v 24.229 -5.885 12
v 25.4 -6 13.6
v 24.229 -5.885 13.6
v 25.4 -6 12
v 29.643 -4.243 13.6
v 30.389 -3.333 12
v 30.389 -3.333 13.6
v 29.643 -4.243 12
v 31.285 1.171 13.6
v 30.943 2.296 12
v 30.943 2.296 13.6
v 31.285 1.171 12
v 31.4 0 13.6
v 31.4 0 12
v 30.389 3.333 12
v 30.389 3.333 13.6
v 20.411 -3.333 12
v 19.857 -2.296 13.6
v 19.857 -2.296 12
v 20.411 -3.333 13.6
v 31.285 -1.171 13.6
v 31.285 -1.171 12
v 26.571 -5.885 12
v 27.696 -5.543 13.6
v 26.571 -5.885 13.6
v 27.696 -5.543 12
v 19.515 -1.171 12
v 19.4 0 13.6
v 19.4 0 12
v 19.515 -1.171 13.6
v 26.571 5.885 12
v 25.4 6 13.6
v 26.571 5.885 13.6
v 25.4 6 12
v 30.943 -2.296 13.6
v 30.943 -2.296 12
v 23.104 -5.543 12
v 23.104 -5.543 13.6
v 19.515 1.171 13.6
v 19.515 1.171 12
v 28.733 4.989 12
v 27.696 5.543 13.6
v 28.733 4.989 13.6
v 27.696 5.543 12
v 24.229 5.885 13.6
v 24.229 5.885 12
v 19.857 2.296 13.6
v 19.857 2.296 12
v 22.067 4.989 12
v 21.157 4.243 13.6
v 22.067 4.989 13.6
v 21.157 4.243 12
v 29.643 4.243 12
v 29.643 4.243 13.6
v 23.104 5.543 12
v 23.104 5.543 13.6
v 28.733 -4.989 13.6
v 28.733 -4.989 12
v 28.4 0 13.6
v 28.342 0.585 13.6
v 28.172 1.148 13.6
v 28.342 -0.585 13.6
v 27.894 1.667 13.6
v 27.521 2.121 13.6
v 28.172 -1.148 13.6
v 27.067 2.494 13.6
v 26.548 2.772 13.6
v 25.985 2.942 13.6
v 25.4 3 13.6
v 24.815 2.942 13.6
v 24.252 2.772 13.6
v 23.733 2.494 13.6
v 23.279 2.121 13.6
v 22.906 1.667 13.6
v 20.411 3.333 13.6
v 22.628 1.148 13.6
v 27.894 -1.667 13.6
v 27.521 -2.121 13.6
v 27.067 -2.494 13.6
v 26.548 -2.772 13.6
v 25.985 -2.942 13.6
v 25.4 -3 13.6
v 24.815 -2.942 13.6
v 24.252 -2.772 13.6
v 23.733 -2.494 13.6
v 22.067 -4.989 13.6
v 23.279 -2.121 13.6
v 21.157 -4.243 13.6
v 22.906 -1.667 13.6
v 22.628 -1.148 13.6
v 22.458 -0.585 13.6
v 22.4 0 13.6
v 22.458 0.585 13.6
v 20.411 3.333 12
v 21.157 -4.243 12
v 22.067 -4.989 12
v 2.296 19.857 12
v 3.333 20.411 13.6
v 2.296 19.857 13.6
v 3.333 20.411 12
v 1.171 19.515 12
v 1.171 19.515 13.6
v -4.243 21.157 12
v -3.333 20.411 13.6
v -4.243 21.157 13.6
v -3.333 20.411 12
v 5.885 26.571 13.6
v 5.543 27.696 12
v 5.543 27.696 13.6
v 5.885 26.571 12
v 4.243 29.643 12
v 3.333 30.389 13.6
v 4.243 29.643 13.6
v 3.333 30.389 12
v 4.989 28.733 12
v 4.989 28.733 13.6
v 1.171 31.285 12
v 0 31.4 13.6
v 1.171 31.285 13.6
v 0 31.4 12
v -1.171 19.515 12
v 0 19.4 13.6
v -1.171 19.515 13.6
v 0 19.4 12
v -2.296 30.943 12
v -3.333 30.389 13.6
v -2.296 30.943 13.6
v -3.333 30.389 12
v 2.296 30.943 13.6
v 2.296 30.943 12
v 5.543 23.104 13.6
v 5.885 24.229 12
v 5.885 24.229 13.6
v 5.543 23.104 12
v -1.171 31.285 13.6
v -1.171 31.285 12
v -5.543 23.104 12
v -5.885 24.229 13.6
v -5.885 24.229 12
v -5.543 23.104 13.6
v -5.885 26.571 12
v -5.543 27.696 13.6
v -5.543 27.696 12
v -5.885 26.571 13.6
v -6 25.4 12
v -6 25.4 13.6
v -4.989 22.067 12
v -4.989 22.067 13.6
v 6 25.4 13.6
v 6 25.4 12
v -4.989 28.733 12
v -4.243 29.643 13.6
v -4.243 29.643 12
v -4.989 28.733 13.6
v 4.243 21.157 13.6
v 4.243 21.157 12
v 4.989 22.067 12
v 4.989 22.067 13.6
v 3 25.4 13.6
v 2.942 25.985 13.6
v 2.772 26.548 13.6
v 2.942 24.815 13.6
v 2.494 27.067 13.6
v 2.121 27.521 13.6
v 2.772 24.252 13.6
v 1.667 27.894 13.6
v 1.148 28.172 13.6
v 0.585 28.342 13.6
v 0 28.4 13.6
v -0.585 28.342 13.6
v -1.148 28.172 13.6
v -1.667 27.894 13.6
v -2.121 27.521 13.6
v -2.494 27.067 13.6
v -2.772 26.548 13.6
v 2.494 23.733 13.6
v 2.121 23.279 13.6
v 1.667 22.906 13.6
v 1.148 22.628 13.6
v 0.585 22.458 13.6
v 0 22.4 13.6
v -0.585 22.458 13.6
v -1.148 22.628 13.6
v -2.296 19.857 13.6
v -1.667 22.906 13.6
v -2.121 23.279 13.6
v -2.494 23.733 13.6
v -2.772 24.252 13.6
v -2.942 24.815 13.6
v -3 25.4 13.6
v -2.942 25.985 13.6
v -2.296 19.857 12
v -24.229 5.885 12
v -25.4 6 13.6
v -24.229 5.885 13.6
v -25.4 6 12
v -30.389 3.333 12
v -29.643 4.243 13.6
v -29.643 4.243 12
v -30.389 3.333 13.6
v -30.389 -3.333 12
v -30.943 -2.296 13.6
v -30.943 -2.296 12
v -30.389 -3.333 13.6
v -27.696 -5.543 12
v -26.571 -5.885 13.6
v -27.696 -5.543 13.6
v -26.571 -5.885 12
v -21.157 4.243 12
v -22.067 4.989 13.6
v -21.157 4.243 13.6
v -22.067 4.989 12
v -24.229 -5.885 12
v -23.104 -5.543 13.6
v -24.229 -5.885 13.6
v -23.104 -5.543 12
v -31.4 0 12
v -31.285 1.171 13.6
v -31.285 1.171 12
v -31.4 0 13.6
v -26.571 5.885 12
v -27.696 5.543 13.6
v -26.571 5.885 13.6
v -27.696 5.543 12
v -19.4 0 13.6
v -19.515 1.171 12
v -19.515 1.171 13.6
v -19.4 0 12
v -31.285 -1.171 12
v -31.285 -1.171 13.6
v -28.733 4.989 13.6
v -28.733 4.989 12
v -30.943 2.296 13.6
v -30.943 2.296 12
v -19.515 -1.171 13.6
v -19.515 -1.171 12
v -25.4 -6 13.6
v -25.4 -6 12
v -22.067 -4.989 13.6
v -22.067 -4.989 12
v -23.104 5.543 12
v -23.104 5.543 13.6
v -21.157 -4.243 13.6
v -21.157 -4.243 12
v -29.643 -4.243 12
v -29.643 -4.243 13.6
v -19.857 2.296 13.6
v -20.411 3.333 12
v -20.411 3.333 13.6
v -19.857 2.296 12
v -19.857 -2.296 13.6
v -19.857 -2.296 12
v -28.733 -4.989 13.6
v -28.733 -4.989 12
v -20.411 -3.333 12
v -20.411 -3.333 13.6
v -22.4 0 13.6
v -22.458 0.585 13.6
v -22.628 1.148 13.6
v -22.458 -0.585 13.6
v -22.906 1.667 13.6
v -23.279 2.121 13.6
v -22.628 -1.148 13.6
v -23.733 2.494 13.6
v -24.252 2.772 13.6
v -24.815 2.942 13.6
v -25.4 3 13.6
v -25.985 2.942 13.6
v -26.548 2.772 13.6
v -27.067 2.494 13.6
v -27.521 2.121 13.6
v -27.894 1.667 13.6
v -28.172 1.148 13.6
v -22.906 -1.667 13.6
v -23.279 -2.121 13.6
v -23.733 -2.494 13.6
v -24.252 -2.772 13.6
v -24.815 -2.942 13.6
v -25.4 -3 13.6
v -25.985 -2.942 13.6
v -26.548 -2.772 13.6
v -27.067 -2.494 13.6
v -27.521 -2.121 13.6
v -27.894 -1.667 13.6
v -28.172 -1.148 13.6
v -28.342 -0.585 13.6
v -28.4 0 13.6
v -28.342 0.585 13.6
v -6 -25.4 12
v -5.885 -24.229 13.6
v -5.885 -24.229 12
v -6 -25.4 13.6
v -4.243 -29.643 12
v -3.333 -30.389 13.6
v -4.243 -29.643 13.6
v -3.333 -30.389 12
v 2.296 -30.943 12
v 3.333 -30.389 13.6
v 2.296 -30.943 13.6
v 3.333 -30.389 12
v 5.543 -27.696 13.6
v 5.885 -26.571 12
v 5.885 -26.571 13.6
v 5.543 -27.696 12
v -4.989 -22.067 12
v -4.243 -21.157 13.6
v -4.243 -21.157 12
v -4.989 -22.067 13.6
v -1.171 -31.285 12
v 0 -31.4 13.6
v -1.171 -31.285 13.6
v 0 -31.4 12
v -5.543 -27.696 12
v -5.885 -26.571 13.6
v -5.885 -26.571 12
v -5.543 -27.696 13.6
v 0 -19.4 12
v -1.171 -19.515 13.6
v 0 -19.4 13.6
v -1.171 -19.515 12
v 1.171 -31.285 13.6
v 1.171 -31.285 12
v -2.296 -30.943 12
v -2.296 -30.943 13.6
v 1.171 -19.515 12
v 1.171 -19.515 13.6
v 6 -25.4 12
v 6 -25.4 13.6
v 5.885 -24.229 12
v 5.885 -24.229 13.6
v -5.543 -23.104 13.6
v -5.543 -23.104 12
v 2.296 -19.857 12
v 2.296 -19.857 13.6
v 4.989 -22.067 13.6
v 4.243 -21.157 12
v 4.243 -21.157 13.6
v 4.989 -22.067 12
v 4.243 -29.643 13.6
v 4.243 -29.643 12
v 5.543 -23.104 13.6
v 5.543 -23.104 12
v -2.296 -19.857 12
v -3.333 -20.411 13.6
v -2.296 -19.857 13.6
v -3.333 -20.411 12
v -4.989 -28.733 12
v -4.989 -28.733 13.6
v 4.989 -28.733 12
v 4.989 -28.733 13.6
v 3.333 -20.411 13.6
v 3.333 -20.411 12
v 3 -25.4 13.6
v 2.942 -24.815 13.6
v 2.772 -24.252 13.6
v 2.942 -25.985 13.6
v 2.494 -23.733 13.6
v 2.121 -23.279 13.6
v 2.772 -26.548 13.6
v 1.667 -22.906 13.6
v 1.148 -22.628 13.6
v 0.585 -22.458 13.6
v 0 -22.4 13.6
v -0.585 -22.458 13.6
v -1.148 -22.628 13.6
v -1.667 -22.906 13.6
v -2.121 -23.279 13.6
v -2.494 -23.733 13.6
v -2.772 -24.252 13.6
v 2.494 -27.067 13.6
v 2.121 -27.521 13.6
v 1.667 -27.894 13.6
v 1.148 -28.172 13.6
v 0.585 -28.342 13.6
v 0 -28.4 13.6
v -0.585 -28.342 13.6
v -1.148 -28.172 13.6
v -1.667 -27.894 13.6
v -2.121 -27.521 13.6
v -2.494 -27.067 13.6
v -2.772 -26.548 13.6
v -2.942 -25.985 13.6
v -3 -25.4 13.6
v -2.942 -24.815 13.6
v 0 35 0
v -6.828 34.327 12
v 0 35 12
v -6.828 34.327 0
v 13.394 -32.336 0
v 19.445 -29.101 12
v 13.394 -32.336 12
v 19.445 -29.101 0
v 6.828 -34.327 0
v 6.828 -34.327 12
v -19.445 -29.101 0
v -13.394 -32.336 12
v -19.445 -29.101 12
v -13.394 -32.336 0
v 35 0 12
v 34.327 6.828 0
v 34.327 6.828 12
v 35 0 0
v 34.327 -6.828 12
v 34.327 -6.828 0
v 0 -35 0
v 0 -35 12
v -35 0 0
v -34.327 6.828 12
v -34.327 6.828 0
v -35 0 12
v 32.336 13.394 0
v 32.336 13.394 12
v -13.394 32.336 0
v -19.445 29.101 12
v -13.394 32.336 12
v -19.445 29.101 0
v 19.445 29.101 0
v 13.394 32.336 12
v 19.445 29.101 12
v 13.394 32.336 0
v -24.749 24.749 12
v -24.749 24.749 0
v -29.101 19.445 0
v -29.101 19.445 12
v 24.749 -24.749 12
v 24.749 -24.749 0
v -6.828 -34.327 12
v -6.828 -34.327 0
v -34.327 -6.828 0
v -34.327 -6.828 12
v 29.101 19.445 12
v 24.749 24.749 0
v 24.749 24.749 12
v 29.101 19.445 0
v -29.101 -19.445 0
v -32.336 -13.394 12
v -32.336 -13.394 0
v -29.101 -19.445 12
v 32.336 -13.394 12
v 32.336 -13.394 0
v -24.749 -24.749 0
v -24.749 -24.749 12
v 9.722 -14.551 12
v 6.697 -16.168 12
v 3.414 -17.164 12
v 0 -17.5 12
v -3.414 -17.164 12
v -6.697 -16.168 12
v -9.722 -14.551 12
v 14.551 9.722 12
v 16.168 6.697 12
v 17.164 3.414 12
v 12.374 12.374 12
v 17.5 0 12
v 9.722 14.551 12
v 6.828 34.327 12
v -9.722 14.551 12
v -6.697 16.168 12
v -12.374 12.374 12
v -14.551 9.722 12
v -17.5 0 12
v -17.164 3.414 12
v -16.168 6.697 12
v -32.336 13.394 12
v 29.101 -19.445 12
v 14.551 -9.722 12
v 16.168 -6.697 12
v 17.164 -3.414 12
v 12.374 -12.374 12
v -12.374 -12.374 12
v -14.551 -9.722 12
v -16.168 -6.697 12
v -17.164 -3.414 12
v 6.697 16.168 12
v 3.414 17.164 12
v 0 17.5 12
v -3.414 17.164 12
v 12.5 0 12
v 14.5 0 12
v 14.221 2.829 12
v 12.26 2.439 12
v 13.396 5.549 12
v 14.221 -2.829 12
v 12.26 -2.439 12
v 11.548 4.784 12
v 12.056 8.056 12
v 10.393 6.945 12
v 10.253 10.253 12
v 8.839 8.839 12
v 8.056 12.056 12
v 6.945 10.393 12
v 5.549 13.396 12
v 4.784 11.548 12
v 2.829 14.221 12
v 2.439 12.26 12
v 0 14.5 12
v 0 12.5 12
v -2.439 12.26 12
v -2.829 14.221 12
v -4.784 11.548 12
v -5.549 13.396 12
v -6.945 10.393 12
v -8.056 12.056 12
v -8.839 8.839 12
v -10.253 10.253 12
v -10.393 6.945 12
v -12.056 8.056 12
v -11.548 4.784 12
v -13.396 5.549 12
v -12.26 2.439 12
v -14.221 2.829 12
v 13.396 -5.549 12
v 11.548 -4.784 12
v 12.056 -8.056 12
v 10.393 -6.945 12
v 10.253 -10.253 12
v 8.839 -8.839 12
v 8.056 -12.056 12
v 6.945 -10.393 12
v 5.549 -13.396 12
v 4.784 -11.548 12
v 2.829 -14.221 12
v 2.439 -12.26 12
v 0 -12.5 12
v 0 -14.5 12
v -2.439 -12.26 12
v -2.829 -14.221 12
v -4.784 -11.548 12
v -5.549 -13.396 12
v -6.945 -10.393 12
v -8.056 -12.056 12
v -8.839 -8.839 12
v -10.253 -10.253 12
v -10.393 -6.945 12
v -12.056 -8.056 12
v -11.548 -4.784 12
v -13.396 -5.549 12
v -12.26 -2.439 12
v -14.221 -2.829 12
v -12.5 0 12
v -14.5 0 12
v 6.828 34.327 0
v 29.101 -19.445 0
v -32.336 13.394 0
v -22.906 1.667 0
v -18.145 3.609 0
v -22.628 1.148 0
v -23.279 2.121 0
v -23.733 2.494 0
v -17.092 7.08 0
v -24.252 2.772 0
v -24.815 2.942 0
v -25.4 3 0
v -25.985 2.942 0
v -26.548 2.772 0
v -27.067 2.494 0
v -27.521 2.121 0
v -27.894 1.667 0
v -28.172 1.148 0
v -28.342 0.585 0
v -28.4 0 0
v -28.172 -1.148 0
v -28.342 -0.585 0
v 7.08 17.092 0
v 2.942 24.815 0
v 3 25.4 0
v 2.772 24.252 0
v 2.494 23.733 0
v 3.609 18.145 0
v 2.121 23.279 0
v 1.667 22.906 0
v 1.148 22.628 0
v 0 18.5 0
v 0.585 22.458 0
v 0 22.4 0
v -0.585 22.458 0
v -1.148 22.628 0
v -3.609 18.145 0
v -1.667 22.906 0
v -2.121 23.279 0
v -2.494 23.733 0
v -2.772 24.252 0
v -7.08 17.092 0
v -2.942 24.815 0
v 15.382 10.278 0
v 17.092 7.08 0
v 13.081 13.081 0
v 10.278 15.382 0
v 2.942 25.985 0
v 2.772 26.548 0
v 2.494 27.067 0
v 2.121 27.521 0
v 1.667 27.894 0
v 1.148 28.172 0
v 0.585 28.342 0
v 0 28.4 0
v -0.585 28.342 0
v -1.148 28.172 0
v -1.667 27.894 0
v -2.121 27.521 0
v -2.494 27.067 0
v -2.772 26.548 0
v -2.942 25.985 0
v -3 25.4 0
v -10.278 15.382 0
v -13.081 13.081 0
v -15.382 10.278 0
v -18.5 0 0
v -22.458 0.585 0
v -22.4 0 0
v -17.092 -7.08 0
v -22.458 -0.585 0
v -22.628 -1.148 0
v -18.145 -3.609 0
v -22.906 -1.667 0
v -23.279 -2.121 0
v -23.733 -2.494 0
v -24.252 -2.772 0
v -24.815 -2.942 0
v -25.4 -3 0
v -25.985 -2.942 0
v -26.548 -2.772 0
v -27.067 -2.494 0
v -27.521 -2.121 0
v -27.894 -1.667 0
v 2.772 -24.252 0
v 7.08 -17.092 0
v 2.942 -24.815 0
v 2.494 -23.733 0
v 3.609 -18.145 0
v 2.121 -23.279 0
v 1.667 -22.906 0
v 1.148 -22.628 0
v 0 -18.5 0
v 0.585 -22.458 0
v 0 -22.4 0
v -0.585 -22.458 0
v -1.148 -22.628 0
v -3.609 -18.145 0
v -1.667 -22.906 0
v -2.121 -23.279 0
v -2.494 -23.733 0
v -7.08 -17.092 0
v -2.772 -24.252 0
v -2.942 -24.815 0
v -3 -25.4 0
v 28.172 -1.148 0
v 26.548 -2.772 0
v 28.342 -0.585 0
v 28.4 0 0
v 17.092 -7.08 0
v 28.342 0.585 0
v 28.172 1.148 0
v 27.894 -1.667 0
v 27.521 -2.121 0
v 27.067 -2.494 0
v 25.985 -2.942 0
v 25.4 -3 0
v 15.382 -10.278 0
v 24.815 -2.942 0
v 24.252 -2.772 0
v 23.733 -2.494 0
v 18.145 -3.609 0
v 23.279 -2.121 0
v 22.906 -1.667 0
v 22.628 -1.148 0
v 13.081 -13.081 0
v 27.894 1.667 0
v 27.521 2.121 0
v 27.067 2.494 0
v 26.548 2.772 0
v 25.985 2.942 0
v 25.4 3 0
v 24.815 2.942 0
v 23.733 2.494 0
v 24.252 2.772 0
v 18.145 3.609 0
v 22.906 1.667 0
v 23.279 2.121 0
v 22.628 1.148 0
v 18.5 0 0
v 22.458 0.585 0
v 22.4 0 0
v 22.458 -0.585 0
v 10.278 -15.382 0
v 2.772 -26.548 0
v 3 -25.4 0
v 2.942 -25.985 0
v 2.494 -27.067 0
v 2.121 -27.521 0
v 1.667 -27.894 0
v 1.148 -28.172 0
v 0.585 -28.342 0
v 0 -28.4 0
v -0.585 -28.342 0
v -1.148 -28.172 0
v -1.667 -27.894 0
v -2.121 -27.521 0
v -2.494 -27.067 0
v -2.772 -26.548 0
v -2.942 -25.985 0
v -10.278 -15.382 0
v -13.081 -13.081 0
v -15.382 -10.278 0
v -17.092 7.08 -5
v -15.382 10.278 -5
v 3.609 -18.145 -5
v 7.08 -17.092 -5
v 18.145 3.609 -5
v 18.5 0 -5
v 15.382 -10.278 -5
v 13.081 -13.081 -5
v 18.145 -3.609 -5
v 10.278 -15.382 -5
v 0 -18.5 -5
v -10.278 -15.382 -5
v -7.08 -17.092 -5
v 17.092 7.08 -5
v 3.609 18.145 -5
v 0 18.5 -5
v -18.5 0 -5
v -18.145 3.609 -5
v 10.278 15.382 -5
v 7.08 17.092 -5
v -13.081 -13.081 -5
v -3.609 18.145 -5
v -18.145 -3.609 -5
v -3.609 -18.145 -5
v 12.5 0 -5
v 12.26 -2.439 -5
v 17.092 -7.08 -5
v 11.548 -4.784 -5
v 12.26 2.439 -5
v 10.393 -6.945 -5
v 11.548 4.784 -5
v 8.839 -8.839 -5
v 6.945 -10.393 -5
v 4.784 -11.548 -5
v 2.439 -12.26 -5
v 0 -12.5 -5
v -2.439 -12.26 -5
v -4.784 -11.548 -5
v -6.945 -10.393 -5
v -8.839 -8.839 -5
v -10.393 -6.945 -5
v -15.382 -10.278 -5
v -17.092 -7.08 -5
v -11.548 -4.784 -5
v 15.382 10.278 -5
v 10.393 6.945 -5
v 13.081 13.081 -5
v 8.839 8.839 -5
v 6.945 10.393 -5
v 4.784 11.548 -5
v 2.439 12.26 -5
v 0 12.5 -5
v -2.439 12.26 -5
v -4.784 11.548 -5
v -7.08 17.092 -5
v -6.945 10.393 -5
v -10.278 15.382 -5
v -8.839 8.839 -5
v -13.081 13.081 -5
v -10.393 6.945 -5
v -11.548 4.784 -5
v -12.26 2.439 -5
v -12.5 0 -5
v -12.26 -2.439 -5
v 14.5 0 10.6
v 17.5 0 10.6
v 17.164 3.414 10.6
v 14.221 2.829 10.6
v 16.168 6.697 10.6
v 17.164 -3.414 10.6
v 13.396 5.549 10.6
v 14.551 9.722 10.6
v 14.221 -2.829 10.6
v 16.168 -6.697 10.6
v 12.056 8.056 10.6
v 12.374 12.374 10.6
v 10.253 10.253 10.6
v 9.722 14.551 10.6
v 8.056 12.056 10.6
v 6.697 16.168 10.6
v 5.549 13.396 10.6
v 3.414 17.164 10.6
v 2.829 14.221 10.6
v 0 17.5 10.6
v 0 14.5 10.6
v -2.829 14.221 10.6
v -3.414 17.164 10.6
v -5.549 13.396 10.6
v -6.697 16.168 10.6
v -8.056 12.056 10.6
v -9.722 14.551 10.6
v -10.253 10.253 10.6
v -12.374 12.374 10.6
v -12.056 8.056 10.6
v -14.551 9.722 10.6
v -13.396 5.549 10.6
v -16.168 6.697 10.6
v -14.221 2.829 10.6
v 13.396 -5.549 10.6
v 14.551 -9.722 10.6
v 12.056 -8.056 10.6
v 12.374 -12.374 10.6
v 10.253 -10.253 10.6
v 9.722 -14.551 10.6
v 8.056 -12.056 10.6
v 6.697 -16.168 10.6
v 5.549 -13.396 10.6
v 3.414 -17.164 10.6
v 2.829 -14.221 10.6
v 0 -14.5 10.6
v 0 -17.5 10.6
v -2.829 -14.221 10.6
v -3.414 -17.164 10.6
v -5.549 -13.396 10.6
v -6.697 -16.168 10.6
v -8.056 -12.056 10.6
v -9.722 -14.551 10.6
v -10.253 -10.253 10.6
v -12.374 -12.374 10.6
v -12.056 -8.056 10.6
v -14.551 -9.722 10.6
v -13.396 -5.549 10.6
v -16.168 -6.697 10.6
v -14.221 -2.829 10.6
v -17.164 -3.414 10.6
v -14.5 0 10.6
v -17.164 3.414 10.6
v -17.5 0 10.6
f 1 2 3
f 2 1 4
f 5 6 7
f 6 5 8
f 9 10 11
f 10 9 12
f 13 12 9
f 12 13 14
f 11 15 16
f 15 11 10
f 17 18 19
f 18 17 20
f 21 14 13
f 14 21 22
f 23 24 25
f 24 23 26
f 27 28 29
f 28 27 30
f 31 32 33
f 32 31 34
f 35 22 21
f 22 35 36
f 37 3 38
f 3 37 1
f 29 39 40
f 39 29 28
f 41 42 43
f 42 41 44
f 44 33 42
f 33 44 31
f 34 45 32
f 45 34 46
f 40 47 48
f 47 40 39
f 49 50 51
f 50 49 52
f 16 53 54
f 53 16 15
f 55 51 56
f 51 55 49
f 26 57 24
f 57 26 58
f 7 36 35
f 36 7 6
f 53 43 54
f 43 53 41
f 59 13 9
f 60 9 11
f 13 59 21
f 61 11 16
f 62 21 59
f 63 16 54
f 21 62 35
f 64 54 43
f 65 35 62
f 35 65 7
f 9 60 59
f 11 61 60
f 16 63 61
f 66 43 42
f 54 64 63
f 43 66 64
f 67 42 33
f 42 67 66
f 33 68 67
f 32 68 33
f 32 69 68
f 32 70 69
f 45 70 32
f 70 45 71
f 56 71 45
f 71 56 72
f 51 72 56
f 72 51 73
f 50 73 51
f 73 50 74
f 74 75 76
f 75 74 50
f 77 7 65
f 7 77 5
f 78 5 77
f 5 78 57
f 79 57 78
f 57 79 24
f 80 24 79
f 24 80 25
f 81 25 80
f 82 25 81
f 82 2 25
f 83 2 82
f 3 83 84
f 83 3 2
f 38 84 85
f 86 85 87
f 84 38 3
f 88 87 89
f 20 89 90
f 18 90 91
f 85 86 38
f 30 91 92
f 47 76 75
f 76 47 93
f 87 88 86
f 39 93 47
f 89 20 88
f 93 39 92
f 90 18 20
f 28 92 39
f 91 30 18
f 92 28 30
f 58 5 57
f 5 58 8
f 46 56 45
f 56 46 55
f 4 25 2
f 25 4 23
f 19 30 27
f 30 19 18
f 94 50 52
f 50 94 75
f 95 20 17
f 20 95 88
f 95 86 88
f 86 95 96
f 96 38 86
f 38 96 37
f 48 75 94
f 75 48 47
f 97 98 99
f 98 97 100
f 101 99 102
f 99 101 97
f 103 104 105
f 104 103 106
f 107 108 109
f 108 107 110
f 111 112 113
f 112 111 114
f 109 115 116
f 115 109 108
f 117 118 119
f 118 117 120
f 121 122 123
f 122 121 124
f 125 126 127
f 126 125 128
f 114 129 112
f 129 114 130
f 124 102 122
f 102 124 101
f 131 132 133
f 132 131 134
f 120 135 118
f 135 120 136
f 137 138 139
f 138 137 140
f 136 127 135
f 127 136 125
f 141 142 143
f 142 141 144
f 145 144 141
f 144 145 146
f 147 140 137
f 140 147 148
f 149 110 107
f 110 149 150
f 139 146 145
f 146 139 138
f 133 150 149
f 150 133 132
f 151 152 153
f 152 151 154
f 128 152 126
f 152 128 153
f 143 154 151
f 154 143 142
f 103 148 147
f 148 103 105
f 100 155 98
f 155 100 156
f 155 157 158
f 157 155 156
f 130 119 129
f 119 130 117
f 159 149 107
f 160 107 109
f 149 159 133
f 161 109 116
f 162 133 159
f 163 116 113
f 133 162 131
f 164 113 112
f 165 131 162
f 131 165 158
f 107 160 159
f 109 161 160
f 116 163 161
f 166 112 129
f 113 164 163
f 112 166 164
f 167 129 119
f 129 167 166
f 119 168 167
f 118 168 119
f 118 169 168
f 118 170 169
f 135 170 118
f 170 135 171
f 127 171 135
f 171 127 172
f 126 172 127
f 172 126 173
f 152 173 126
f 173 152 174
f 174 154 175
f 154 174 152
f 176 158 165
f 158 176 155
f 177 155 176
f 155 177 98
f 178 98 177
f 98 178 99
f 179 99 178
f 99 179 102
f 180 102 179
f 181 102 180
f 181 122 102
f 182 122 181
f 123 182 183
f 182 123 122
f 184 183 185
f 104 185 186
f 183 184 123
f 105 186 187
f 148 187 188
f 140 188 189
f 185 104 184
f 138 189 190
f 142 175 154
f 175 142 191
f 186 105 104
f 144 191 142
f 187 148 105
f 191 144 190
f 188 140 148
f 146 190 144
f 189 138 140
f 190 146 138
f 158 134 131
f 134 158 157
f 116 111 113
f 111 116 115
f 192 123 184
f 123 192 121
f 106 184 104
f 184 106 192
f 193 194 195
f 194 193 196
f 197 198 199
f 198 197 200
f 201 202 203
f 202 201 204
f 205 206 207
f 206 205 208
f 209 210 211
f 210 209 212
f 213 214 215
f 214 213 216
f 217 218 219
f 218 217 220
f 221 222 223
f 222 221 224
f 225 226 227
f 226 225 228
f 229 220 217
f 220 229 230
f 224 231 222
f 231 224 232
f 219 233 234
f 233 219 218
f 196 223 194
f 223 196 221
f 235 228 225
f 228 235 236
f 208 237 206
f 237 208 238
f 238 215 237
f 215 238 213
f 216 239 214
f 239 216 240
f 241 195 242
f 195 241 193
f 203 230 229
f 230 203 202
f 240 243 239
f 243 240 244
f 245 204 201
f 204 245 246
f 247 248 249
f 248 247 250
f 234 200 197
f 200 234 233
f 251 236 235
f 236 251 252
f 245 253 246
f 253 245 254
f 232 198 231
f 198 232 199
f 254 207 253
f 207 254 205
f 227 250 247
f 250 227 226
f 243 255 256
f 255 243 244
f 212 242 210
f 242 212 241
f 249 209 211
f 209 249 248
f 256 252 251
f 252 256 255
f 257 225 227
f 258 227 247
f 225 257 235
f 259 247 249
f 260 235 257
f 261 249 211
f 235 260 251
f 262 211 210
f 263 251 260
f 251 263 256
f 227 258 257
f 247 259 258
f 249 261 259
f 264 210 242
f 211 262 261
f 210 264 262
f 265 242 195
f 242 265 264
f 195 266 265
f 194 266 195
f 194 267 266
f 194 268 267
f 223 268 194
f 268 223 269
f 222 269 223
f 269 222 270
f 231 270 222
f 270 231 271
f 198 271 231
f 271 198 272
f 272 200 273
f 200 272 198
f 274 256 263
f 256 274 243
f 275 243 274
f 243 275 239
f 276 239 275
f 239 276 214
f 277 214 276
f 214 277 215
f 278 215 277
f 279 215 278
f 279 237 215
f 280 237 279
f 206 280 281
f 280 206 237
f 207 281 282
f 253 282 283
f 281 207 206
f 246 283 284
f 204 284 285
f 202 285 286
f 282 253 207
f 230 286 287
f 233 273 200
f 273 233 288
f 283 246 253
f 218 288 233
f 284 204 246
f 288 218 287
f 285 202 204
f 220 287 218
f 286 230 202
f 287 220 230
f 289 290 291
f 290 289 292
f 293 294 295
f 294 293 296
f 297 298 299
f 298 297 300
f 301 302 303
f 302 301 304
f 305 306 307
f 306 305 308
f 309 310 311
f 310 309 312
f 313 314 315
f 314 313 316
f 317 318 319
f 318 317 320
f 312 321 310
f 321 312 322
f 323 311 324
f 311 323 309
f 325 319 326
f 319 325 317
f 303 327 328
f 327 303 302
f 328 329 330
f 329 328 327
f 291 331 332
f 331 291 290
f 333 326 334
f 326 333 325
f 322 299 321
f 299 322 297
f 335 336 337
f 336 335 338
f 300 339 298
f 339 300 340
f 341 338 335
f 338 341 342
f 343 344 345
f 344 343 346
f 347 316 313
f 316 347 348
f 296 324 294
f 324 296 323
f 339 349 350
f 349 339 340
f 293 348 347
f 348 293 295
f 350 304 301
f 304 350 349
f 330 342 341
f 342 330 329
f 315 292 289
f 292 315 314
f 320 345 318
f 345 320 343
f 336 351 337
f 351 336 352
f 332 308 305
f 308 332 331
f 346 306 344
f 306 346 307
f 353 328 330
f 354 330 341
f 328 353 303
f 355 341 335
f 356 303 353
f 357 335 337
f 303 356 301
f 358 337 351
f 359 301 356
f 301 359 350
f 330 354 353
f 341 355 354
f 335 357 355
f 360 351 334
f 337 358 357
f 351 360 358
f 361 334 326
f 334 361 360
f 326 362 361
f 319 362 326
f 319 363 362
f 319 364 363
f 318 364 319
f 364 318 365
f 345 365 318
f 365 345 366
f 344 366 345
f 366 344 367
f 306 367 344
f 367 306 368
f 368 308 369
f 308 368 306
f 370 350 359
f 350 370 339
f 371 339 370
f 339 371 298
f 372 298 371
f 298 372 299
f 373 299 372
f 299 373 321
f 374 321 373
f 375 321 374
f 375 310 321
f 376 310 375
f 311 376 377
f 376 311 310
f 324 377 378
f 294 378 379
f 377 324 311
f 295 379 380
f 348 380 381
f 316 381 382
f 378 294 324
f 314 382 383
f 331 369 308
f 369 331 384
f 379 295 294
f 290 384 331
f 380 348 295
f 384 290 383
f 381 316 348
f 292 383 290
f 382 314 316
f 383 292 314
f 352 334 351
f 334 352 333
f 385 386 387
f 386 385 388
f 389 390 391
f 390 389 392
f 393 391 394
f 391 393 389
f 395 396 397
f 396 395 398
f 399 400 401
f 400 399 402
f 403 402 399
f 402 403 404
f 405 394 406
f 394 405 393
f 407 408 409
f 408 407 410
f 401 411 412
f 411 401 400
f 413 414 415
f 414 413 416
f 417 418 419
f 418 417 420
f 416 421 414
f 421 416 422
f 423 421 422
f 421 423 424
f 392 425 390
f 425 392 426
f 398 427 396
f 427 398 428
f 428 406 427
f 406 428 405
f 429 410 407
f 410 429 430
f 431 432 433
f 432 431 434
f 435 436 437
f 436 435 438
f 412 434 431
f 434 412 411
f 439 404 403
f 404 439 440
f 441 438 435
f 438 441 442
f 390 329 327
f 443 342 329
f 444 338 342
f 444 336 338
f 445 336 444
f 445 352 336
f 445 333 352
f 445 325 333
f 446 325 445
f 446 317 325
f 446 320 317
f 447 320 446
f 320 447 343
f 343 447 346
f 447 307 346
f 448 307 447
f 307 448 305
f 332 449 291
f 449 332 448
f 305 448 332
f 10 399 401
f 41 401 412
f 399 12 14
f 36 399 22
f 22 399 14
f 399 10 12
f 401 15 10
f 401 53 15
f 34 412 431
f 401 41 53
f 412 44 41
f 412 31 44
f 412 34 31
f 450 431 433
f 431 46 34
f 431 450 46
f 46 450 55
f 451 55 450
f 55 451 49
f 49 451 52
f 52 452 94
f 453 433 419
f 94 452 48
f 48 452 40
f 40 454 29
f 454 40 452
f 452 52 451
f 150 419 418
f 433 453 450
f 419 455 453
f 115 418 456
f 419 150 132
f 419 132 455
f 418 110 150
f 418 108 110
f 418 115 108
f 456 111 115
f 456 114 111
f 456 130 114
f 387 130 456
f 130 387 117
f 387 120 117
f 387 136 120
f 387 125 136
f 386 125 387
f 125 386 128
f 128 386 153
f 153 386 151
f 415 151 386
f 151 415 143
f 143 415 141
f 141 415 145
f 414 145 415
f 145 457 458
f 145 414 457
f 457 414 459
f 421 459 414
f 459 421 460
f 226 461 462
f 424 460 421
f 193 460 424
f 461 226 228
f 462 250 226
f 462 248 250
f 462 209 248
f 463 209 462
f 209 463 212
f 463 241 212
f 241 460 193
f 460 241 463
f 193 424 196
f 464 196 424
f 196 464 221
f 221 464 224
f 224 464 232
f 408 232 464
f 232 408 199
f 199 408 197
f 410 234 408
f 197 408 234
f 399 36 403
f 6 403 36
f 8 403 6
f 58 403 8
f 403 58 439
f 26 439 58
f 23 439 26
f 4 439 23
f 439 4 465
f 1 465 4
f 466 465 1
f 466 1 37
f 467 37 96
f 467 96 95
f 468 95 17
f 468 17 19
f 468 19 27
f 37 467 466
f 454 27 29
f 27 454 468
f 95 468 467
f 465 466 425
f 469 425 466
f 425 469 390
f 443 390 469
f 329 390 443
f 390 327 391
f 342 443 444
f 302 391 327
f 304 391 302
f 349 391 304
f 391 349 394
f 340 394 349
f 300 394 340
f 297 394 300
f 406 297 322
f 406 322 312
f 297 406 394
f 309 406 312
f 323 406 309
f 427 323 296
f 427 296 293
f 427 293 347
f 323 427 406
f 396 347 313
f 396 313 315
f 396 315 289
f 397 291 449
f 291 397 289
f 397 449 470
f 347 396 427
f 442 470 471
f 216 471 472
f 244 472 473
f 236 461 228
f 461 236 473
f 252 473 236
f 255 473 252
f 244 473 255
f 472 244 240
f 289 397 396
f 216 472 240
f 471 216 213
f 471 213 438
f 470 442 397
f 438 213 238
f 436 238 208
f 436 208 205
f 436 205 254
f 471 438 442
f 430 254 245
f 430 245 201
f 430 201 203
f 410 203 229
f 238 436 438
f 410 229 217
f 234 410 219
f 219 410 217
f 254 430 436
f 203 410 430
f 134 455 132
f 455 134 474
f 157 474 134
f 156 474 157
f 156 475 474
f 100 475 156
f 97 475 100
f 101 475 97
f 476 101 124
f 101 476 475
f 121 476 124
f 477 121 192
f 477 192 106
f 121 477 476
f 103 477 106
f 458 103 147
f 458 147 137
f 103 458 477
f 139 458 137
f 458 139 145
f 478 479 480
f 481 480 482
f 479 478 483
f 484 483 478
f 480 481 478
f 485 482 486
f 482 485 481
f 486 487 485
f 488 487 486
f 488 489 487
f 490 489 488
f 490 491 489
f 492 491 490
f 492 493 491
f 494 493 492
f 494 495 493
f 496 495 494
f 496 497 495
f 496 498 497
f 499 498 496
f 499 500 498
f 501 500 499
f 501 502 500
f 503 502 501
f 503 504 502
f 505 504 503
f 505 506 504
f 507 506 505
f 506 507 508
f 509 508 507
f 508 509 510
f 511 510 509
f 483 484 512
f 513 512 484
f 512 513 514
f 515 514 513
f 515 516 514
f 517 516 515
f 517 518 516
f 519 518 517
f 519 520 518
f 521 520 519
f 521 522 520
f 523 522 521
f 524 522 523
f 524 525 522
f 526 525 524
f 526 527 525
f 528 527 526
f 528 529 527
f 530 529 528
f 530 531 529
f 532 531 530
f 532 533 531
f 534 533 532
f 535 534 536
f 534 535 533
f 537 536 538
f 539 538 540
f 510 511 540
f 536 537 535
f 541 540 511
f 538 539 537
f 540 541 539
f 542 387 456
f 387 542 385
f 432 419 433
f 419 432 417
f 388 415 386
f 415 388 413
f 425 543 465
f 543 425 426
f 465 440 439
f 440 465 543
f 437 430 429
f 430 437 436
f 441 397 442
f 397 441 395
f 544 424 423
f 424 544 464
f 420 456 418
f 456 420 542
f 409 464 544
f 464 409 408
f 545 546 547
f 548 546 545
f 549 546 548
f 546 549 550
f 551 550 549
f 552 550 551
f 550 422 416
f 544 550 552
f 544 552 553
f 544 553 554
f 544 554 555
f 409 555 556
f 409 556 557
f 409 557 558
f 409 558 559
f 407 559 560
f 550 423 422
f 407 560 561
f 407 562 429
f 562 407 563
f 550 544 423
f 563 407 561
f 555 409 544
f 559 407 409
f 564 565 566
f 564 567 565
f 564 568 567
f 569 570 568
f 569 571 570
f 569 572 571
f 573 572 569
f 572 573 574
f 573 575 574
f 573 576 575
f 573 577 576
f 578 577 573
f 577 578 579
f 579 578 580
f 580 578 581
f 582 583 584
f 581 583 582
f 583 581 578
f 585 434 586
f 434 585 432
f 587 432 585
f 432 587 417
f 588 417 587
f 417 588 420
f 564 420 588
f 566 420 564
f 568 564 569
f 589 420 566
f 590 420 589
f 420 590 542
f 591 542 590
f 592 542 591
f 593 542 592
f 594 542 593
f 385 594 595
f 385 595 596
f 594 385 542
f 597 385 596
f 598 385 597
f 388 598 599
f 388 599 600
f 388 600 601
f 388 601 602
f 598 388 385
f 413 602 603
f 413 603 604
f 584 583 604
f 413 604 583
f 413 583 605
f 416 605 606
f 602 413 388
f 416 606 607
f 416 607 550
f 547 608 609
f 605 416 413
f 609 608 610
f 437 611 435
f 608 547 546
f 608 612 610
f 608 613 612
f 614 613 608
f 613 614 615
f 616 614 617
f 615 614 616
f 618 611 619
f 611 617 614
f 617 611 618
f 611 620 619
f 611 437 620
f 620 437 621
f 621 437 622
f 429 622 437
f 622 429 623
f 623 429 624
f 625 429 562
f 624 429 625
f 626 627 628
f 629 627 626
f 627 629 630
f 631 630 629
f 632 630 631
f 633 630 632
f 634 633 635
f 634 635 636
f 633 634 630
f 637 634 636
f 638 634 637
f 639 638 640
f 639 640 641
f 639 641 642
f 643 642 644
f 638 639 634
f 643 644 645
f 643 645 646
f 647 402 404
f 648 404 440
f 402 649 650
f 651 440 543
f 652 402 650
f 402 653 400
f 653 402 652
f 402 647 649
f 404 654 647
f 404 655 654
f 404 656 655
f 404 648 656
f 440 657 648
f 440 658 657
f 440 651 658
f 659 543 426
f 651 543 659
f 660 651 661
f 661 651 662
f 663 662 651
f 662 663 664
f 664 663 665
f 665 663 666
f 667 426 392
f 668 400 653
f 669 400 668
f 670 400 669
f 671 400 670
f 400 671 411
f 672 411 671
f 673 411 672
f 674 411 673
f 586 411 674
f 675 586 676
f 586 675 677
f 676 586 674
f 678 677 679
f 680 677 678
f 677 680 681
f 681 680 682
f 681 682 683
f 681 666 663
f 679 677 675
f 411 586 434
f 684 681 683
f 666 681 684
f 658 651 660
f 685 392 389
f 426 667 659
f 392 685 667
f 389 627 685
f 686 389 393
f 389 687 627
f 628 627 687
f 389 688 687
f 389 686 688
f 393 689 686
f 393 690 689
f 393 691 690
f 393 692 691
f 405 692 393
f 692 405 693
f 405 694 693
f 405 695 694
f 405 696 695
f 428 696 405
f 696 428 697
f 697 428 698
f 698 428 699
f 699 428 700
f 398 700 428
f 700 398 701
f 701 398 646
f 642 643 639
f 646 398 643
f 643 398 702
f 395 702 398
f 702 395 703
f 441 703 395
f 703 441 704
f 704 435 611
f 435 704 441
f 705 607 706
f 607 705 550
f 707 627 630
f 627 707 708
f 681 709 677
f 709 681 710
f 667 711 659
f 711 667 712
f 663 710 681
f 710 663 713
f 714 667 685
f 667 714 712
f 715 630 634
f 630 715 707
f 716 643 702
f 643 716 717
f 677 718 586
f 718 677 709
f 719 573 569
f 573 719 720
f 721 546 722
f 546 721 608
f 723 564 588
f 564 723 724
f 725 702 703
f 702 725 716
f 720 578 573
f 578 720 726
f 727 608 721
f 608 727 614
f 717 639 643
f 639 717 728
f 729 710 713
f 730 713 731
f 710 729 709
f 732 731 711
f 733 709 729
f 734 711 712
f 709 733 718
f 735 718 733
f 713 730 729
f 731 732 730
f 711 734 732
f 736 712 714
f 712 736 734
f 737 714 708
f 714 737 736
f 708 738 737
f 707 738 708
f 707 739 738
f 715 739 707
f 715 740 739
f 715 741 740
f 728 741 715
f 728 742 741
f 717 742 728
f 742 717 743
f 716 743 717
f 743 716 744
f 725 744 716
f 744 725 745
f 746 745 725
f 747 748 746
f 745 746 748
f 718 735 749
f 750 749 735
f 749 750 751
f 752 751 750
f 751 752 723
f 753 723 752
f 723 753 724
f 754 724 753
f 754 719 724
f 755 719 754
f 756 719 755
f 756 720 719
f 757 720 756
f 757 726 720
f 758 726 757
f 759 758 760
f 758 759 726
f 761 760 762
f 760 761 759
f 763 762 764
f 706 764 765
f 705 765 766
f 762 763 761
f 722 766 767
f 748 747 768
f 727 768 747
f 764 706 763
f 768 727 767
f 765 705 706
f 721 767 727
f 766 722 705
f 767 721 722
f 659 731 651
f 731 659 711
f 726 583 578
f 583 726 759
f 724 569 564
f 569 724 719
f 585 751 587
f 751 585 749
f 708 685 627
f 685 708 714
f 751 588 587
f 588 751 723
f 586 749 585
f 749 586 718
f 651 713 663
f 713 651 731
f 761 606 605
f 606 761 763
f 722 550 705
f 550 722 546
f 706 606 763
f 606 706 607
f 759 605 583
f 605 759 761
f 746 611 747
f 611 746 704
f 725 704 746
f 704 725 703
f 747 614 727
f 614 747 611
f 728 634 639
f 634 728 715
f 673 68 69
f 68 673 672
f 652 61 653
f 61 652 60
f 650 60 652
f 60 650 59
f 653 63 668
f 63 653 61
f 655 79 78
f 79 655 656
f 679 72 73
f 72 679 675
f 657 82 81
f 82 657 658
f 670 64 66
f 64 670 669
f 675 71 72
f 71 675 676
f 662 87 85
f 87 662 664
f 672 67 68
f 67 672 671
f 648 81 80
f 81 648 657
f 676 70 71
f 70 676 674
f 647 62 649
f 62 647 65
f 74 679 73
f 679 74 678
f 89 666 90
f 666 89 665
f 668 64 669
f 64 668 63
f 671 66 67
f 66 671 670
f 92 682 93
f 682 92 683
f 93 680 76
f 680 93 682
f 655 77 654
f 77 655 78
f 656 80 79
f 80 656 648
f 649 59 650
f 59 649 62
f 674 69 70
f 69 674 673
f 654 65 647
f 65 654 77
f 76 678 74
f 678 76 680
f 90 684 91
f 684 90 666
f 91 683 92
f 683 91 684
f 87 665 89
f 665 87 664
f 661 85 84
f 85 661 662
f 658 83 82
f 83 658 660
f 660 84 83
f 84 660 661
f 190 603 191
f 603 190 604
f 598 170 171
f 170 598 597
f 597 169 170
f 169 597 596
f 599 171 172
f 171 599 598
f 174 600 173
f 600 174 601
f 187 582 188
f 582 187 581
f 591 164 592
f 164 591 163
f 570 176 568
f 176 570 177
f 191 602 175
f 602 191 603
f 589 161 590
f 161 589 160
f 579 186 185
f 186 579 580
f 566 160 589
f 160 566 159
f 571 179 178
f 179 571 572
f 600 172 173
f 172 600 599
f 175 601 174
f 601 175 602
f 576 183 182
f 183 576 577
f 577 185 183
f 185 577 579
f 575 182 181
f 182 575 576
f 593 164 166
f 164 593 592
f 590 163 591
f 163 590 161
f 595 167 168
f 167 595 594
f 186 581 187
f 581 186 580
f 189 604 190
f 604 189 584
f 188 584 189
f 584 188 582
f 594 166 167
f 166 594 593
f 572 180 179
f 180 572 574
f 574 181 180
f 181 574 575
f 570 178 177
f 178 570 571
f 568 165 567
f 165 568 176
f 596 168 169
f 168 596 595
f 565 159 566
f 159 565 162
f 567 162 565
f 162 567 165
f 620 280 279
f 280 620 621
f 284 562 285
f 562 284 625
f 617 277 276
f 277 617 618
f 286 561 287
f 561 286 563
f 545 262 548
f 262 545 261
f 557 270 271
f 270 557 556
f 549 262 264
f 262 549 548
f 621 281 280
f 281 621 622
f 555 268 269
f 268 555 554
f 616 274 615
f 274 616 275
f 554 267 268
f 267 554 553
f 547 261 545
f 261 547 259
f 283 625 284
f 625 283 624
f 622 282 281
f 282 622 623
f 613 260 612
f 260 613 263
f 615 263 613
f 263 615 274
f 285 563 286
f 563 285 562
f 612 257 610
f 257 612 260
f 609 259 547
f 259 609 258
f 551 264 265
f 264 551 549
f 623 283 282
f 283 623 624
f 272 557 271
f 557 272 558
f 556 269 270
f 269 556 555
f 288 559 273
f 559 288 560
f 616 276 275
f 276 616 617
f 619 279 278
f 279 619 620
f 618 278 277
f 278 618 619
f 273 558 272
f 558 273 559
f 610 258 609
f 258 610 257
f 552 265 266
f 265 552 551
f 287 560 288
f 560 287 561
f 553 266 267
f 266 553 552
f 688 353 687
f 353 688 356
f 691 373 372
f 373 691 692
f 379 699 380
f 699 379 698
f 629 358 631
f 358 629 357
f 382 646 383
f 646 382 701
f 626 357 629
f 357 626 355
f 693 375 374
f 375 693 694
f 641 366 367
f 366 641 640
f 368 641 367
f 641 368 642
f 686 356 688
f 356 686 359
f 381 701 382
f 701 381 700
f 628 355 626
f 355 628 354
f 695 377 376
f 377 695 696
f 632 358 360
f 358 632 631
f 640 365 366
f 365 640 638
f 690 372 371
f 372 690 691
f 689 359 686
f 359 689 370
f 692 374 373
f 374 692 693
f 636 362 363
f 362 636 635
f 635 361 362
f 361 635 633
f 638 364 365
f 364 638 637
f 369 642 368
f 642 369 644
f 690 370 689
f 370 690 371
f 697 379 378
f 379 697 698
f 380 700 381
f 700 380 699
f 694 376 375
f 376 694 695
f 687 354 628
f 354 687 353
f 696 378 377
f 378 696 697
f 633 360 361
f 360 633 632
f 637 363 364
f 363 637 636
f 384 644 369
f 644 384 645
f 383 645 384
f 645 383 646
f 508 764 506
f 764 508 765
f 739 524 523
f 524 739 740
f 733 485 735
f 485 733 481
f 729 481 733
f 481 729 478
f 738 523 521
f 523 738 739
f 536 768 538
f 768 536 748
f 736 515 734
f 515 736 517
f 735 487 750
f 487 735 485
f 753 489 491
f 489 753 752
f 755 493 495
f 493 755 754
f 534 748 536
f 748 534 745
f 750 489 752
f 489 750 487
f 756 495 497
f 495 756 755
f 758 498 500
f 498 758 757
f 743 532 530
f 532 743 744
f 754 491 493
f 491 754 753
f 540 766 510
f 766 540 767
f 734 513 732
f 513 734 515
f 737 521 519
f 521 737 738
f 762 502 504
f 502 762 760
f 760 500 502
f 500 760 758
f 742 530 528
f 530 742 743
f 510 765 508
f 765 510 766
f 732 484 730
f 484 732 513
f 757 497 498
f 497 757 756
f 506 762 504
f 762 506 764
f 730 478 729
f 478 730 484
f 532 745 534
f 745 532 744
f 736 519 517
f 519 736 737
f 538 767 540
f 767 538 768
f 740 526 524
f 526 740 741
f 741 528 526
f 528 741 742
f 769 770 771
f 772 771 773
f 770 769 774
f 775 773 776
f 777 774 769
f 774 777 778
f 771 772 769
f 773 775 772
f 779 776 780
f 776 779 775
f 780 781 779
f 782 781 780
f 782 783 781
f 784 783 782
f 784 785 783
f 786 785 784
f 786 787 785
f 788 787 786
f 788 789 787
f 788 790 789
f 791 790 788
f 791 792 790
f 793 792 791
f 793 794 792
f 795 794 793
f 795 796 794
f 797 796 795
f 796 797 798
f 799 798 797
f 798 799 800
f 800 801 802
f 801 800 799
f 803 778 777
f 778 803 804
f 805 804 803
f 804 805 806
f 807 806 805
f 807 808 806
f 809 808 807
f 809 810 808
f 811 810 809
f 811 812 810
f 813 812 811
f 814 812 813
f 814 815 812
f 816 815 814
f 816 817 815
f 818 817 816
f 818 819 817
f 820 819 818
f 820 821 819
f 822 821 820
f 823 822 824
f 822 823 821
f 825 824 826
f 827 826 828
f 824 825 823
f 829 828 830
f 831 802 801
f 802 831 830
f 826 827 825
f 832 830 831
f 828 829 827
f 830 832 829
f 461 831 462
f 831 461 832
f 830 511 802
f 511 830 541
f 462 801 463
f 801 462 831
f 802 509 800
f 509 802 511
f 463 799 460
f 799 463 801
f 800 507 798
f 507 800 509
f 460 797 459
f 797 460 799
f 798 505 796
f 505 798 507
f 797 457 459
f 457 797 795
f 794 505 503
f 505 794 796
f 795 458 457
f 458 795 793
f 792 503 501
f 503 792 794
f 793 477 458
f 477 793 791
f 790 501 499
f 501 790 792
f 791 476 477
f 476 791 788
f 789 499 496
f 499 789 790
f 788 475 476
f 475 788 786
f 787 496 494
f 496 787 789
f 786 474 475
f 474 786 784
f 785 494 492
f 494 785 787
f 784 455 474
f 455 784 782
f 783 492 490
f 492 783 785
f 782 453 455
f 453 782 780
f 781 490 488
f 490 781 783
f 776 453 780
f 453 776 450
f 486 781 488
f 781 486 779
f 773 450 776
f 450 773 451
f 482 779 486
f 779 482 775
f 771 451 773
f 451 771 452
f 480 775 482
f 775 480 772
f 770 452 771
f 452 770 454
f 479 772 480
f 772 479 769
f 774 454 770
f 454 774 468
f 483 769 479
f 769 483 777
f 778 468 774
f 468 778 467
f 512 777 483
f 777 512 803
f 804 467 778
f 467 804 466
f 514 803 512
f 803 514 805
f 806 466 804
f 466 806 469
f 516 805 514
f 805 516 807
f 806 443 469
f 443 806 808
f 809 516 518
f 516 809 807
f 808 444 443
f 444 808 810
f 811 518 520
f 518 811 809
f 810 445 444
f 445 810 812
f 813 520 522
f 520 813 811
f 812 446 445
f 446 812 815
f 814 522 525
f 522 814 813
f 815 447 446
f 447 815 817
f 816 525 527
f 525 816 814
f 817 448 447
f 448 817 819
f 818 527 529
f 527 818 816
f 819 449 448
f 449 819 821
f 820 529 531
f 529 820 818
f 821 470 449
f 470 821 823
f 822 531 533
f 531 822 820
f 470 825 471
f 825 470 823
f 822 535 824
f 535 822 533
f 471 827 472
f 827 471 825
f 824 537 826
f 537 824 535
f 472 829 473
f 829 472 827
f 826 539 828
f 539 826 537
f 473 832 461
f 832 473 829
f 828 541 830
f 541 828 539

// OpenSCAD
$fn = 32;

// ----------------------------------------------------------------------
// Bolt-circle flange: 70 mm outside, 4 bolt holes, bore 25 mm
// ----------------------------------------------------------------------

// --- parameters (mm) ---
flange_d = 70;            // flange outside diameter
flange_t = 12;            // flange thickness
bolts = 4;                // number of bolt holes
bolt_d = 6;               // bolt clearance
bolt_r = 25.4;            // bolt circle radius
bore_d = 25;              // centre bore
spigot_d = 37;            // spigot diameter
spigot_h = 6;             // spigot height below the flange
sink = 1;                 // overlap into the flange
spot_d = 12;              // spot faced bosses
spot_h = 1.6;             // spot face height
groove_w = 3;             // gasket groove width
groove_d = 1.4;           // gasket groove depth
groove_r = 14.5;          // groove radius
groove_z = 10.6;          // groove floor depth from the face

module body() {
  cylinder(h = flange_t, d = flange_d);
  /* spigot on the back face, sunk into the flange */
  translate([0, 0, -spigot_h + sink]) cylinder(h = spigot_h, d = spigot_d);
  /* spot faced pads under the bolt heads */
  for (i = [0 : bolts - 1]) rotate([0, 0, i * 360 / bolts]) translate([bolt_r, 0, flange_t - 1]) cylinder(h = spot_h + 1, d = spot_d);
}

difference() {
  body();
  /* bolt circle */
  for (i = [0 : bolts - 1]) rotate([0, 0, i * 360 / bolts]) translate([bolt_r, 0, -spigot_h - 1]) cylinder(h = flange_t + spigot_h + 3, d = bolt_d);
  translate([0, 0, -spigot_h - 1]) cylinder(h = flange_t + spigot_h + 3, d = bore_d);
  /* gasket groove on the front face */
  rotate_extrude() translate([groove_r, groove_z]) square([groove_w, groove_d + 1]);
}
